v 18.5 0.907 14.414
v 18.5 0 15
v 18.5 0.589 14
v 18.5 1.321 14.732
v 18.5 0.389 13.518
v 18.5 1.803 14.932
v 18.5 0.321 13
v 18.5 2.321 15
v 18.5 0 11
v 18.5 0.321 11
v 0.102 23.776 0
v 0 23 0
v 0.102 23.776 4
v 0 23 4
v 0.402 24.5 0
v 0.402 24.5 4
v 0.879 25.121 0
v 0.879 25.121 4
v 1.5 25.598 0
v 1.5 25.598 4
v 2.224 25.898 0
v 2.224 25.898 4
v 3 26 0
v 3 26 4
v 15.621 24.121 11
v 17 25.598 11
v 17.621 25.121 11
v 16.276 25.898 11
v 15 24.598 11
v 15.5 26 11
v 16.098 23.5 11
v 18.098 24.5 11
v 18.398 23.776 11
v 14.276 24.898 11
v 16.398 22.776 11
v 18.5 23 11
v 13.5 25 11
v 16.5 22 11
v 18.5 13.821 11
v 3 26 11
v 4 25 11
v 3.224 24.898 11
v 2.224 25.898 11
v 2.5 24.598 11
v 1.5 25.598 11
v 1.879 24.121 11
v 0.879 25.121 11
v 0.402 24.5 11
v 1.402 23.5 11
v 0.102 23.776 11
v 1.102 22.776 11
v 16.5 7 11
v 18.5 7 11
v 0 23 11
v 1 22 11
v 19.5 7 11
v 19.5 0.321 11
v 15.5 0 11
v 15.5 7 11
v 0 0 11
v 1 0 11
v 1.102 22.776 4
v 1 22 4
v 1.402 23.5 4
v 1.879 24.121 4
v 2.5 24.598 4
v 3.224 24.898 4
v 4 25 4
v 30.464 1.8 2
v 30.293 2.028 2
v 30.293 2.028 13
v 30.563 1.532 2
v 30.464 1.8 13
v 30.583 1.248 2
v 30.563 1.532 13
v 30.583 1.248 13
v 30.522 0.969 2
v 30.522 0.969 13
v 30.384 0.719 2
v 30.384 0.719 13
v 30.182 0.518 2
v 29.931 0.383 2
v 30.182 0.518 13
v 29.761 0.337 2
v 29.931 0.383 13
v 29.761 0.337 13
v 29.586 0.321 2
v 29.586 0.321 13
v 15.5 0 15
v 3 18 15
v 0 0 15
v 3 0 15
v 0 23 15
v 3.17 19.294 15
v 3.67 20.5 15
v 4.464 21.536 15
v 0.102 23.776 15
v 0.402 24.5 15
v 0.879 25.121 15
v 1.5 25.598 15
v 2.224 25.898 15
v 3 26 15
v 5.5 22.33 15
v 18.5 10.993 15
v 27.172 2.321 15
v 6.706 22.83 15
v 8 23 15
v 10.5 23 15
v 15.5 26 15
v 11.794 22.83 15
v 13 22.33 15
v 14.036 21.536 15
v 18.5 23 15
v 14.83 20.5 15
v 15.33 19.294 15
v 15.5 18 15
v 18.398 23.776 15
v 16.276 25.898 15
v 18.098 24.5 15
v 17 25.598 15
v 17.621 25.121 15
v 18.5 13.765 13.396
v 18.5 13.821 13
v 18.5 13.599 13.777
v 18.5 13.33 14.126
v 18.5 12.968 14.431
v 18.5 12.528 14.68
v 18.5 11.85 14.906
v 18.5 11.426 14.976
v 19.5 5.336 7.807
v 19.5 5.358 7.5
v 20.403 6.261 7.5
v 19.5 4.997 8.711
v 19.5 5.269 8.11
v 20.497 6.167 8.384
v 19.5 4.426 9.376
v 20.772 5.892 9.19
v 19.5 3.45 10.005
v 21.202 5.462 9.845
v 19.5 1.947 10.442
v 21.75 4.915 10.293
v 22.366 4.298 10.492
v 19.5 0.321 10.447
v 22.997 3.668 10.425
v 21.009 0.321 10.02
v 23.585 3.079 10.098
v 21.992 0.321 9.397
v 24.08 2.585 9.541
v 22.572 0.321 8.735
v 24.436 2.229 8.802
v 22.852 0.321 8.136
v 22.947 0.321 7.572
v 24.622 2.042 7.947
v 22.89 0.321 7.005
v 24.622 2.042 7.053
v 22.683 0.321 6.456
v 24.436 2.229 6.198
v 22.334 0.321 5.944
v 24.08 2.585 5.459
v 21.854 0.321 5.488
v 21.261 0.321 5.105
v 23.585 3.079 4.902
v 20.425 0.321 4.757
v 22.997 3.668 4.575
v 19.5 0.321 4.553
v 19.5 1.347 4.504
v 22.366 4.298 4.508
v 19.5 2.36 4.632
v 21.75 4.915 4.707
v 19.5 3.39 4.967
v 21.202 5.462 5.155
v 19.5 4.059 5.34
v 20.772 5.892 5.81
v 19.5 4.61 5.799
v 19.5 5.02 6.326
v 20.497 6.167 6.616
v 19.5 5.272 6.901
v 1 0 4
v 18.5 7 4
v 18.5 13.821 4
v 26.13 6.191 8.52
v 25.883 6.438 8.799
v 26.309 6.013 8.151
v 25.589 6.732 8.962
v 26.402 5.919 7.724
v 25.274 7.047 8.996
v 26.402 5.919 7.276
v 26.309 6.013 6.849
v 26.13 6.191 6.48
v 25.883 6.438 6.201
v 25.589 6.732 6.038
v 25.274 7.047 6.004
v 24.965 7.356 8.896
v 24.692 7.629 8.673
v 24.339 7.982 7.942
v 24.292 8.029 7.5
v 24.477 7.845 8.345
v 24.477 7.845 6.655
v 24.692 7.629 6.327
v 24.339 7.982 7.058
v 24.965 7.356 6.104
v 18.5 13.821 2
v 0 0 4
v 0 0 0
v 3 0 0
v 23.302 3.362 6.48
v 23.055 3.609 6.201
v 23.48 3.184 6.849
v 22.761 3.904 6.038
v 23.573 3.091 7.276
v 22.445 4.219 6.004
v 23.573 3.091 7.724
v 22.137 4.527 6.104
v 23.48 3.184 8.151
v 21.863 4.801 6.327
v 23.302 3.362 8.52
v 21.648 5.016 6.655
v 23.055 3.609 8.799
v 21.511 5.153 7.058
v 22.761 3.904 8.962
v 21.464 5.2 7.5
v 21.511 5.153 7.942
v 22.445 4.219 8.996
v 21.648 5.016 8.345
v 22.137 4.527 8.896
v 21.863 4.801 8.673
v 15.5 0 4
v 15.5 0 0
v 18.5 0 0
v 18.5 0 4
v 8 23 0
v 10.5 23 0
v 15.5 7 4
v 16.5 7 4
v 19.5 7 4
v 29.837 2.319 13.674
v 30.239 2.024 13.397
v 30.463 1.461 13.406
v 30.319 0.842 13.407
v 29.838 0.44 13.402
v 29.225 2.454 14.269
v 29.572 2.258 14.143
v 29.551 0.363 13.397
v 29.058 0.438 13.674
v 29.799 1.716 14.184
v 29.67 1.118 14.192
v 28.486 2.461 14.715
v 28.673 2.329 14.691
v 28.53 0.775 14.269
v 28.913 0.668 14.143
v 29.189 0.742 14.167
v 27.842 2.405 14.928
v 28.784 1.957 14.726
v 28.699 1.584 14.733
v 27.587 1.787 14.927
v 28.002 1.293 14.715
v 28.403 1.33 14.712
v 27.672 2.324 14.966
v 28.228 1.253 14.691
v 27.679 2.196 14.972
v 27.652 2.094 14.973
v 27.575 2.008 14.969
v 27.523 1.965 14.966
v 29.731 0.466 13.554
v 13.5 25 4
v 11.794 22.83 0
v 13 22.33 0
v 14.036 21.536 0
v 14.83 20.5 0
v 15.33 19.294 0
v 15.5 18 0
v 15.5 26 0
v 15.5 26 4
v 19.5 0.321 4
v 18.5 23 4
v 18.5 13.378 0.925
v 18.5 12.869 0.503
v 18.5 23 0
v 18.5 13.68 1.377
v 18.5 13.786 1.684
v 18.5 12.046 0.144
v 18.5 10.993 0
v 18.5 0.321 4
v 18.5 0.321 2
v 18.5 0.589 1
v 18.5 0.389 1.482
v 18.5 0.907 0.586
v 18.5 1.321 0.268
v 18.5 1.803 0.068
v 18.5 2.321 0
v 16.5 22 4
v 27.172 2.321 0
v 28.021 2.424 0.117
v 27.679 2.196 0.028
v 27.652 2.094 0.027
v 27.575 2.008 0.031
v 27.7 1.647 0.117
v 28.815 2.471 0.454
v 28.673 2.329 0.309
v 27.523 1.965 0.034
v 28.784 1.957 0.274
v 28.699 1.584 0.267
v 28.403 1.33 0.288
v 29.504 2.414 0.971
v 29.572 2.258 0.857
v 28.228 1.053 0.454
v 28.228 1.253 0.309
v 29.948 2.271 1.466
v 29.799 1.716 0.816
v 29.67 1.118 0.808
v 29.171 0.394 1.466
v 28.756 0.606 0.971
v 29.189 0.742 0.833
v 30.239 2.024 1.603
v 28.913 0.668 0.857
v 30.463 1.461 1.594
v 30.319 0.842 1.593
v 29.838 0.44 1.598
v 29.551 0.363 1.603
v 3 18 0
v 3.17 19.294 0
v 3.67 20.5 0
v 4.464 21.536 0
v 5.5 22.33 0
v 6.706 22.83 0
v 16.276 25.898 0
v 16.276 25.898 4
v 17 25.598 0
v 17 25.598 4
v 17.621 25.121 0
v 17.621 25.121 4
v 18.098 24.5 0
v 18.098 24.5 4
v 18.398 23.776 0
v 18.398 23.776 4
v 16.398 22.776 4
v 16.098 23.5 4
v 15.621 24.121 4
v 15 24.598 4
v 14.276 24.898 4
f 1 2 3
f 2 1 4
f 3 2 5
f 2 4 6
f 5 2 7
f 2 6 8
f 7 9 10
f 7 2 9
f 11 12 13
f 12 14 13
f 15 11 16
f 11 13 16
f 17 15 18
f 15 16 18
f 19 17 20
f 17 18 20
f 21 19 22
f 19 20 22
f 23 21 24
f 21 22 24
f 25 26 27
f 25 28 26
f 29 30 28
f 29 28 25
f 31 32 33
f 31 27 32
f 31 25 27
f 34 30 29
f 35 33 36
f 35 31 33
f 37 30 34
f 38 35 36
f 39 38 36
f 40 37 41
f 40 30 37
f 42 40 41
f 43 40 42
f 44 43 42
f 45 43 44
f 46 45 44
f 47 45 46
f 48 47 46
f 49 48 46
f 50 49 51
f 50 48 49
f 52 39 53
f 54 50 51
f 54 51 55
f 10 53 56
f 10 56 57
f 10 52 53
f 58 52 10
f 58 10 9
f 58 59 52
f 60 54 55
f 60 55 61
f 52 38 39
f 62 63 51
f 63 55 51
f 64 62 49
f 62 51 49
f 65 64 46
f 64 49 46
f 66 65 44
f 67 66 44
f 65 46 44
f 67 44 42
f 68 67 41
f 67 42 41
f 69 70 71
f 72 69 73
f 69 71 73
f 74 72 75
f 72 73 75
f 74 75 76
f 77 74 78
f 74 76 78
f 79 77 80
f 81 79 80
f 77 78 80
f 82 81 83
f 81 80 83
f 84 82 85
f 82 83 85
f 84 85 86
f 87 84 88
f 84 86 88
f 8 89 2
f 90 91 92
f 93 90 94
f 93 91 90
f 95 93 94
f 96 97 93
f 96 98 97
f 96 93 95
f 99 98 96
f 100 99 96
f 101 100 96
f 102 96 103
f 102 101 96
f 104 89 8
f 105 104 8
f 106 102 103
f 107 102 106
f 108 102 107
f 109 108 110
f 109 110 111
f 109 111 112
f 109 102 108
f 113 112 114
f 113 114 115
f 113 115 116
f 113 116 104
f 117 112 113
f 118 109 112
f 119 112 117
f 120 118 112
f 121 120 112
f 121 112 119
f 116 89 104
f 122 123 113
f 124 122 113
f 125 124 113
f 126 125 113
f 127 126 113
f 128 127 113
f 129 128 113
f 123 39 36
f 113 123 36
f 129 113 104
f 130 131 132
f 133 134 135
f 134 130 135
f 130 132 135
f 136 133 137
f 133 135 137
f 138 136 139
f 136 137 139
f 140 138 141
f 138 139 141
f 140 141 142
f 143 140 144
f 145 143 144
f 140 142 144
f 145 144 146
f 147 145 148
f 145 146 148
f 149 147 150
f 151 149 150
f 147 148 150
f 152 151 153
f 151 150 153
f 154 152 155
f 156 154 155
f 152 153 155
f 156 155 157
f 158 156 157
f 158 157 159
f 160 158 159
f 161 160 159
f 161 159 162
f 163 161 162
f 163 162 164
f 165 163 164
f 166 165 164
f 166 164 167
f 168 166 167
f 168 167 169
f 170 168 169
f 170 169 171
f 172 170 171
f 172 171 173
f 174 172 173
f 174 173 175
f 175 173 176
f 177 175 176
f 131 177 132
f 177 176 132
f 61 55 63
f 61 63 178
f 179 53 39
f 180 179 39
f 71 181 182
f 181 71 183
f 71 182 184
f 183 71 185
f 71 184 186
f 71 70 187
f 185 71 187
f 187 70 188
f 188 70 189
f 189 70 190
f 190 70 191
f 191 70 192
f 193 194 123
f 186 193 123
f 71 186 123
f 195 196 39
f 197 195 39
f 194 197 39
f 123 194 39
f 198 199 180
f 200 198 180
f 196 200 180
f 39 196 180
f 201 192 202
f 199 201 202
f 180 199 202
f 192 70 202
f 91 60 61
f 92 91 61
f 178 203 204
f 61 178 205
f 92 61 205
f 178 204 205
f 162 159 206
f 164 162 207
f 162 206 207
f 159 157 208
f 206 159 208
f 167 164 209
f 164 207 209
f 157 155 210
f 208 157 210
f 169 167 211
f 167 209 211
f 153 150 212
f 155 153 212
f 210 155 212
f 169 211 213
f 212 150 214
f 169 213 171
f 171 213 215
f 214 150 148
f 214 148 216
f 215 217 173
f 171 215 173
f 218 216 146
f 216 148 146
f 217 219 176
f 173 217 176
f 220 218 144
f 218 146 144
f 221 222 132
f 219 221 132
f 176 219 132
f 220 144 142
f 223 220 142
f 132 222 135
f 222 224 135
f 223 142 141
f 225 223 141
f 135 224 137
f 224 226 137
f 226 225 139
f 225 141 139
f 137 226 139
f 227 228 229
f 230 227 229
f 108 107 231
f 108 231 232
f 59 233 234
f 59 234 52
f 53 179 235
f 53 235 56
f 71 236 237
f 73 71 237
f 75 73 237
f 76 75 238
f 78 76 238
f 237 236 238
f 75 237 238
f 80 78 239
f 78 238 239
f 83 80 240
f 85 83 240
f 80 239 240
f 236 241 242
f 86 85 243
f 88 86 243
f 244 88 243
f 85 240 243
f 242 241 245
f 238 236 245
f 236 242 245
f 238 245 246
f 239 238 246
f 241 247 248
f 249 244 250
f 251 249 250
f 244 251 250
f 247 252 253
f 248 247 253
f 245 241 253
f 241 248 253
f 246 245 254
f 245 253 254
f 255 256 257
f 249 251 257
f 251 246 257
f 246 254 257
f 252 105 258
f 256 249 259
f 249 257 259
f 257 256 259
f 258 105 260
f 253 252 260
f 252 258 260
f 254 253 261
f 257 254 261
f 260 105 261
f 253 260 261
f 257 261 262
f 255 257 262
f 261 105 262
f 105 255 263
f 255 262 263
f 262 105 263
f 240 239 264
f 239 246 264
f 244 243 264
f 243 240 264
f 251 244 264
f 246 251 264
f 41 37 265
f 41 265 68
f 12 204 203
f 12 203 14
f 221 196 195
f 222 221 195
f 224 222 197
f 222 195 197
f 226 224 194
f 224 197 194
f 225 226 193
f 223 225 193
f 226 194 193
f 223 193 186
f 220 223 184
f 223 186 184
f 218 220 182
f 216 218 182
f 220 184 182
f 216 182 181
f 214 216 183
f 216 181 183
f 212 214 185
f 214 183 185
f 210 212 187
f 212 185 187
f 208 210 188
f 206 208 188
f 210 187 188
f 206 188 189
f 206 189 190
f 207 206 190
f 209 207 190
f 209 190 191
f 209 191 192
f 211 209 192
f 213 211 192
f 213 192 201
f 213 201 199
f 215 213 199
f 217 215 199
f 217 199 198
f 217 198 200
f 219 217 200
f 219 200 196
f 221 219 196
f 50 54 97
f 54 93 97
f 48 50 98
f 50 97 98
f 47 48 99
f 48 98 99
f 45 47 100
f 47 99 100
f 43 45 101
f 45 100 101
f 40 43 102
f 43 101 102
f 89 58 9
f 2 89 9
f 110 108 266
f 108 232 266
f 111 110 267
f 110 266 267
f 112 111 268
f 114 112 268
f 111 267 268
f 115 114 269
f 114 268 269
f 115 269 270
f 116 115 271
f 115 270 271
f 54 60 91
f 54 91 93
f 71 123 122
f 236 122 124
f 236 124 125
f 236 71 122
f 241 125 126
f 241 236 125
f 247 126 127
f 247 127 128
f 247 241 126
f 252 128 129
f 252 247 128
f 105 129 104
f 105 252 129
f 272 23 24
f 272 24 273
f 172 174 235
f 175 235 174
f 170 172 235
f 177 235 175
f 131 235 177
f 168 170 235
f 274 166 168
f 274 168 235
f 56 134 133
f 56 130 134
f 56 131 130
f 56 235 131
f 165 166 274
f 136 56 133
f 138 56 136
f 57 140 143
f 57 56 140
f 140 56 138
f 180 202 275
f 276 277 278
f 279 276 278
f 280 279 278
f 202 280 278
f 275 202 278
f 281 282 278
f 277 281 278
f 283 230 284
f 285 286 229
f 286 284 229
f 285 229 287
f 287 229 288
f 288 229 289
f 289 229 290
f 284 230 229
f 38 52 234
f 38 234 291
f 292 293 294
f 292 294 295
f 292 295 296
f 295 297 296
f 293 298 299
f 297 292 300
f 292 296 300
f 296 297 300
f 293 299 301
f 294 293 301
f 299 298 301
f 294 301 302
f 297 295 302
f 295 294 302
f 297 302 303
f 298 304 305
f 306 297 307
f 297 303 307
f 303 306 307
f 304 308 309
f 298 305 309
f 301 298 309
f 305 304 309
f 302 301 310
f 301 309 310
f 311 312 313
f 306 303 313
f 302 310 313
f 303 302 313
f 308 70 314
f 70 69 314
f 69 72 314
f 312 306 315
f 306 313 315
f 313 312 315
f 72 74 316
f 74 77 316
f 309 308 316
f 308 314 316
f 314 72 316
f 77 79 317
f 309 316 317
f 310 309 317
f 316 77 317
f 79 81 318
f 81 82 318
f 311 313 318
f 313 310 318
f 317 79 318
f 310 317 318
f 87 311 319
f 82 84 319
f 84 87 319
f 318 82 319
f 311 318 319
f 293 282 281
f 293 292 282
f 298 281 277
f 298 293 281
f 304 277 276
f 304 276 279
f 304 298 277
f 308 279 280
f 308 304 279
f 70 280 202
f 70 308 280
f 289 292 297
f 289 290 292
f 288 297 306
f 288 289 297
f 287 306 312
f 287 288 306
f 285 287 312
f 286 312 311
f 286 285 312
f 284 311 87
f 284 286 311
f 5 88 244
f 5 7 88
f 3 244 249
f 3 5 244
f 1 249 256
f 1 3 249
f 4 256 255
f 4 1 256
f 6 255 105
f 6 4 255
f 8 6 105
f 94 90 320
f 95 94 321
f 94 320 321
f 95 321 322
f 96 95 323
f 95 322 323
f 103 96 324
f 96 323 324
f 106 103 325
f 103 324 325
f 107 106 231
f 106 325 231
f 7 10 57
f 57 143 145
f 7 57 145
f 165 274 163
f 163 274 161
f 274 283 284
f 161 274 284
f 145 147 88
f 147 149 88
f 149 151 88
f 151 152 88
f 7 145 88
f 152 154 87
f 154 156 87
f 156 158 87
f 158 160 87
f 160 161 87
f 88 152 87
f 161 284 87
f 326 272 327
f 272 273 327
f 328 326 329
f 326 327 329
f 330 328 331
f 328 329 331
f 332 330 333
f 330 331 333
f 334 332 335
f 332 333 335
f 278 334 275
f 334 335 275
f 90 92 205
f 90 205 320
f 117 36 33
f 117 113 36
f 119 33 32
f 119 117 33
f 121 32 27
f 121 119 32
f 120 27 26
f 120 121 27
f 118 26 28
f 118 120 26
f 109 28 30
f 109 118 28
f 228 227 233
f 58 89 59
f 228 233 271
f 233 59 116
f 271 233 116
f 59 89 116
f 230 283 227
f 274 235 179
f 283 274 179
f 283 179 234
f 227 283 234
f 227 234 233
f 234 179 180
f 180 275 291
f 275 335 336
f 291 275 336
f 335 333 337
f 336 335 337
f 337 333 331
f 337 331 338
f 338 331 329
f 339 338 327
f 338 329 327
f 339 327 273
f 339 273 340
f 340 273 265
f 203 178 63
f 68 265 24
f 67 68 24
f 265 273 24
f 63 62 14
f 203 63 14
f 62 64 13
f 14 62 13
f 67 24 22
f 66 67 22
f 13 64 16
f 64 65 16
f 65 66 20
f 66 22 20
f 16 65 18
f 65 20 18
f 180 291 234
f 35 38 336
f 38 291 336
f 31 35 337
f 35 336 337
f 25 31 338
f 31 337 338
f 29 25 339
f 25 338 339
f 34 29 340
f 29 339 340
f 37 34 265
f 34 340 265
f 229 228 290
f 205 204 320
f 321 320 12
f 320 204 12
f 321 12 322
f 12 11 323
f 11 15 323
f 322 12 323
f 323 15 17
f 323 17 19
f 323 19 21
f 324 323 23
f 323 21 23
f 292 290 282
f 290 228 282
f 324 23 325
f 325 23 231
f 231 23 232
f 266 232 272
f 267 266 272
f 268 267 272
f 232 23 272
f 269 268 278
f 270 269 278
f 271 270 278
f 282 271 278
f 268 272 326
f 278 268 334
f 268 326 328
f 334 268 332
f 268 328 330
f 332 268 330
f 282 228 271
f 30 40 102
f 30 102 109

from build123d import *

# Parameters (mm, degrees)
SKETCH_W        = 18.5
SKETCH_H        = 26
PAD_DEPTH       = 15
SKETCH001_W     = 12.5
SKETCH001_H     = 23
POCKET_DEPTH    = 15
SKETCH002_W     = 30
SKETCH002_H     = 7
POCKET001_DEPTH = 1
PAD001_DEPTH    = 15
SKETCH004_R     = 1.5
POCKET002_DEPTH = 15
SKETCH005_W     = 30
SKETCH005_H     = 7
POCKET003_DEPTH = 1
SKETCH006_W     = 30
SKETCH006_H     = 7
POCKET004_DEPTH = 2
SKETCH007_W     = 7
SKETCH007_H     = 7
POCKET005_DEPTH = 4
SKETCH008_R     = 3
POCKET006_DEPTH = 10
FILLET_R        = 5
FILLET001_R     = 3
FILLET002_R     = 1
FILLET003_R     = 2


with BuildPart() as part:
    # Sketch → Pad (new body)
    with BuildSketch(Plane.XY):
        with Locations((9.25, 13)):
            Rectangle(SKETCH_W, SKETCH_H)
    extrude(amount=PAD_DEPTH)

    # Sketch001 (on Face6 of Pad) → Pocket (cut)
    with BuildSketch(Plane.XY.offset(15)):
        with Locations((9.25, 11.5)):
            Rectangle(SKETCH001_W, SKETCH001_H)
    extrude(amount=-POCKET_DEPTH, mode=Mode.SUBTRACT)

    # Sketch002 (on Face6 of Pocket) → Pocket001 (cut)
    with BuildSketch(Plane(origin=(0, 26, 0), x_dir=(-1, 0, 0), z_dir=(0, 1, 0))):
        with Locations((-15, 7.5)):
            Rectangle(SKETCH002_W, SKETCH002_H)
    extrude(amount=-POCKET001_DEPTH, mode=Mode.SUBTRACT)

    # Sketch003 (on Face4 of Pocket001) → Pad001 (join)
    with BuildSketch(Plane.XY):
        Polygon((18.5, 13.821131), (18.5, 0.321131), (32, 0.321131), align=None)
    extrude(amount=PAD001_DEPTH)

    # Sketch004 (on Face19 of Pad001) → Pocket002 (cut)
    with BuildSketch(Plane(origin=(16.160565, 16.160566, 0), x_dir=(-0.707107, 0.707107, 0), z_dir=(0.707107, 0.707107, 0))):
        with Locations((-13, 7.5)):
            Circle(SKETCH004_R)
    extrude(amount=-POCKET002_DEPTH, mode=Mode.SUBTRACT)

    # Sketch005 (on Face5 of Pocket002) → Pocket003 (cut)
    with BuildSketch(Plane(origin=(0, 0, 0), x_dir=(0, -1, 0), z_dir=(-1, 0, 0))):
        with Locations((-15, 7.5)):
            Rectangle(SKETCH005_W, SKETCH005_H)
    extrude(amount=-POCKET003_DEPTH, mode=Mode.SUBTRACT)

    # Sketch006 (on Face13 of Pocket003) → Pocket004 (cut)
    with BuildSketch(Plane.YZ.offset(18.5)):
        with Locations((15, 7.5)):
            Rectangle(SKETCH006_W, SKETCH006_H)
    extrude(amount=-POCKET004_DEPTH, mode=Mode.SUBTRACT)

    # Sketch007 (on Face15 of Pocket004) → Pocket005 (cut)
    with BuildSketch(Plane(origin=(15.5, 0, 0), x_dir=(0, -1, 0), z_dir=(-1, 0, 0))):
        with Locations((-3.5, 7.5)):
            Rectangle(SKETCH007_W, SKETCH007_H)
    extrude(amount=-POCKET005_DEPTH, mode=Mode.SUBTRACT)

    # Sketch008 (on Face29 of Pocket005) → Pocket006 (cut)
    with BuildSketch(Plane(origin=(13.332138, 13.332138, 0), x_dir=(-0.707107, 0.707107, 0), z_dir=(0.707107, 0.707107, 0))):
        with Locations((-13, 7.5)):
            Circle(SKETCH008_R)
    extrude(amount=-POCKET006_DEPTH, mode=Mode.SUBTRACT)

    # Fillet
    fillet_edges = [part.edges().sort_by_distance(p)[0] for p in [
        (15.5, 23, 7.5),
        (3, 23, 7.5),
    ]]
    fillet(fillet_edges, radius=FILLET_R)

    # Fillet001
    fillet001_edges = [part.edges().sort_by_distance(p)[0] for p in [
        (0, 26, 13),
        (18.5, 26, 13),
        (18.5, 26, 2),
        (0, 26, 2),
        (1, 25, 7.5),
        (16.5, 25, 7.5),
    ]]
    fillet(fillet001_edges, radius=FILLET001_R)

    # Fillet002
    fillet002_edges = [part.edges().sort_by_distance(p)[0] for p in [
        (32, 0.321131, 7.5),
    ]]
    fillet(fillet002_edges, radius=FILLET002_R)

    # Fillet003
    fillet003_edges = [part.edges().sort_by_distance(p)[0] for p in [
        (30.509666, 0.938448, 15),
        (30.509666, 0.938448, 0),
    ]]
    fillet(fillet003_edges, radius=FILLET003_R)


solid = part.part
